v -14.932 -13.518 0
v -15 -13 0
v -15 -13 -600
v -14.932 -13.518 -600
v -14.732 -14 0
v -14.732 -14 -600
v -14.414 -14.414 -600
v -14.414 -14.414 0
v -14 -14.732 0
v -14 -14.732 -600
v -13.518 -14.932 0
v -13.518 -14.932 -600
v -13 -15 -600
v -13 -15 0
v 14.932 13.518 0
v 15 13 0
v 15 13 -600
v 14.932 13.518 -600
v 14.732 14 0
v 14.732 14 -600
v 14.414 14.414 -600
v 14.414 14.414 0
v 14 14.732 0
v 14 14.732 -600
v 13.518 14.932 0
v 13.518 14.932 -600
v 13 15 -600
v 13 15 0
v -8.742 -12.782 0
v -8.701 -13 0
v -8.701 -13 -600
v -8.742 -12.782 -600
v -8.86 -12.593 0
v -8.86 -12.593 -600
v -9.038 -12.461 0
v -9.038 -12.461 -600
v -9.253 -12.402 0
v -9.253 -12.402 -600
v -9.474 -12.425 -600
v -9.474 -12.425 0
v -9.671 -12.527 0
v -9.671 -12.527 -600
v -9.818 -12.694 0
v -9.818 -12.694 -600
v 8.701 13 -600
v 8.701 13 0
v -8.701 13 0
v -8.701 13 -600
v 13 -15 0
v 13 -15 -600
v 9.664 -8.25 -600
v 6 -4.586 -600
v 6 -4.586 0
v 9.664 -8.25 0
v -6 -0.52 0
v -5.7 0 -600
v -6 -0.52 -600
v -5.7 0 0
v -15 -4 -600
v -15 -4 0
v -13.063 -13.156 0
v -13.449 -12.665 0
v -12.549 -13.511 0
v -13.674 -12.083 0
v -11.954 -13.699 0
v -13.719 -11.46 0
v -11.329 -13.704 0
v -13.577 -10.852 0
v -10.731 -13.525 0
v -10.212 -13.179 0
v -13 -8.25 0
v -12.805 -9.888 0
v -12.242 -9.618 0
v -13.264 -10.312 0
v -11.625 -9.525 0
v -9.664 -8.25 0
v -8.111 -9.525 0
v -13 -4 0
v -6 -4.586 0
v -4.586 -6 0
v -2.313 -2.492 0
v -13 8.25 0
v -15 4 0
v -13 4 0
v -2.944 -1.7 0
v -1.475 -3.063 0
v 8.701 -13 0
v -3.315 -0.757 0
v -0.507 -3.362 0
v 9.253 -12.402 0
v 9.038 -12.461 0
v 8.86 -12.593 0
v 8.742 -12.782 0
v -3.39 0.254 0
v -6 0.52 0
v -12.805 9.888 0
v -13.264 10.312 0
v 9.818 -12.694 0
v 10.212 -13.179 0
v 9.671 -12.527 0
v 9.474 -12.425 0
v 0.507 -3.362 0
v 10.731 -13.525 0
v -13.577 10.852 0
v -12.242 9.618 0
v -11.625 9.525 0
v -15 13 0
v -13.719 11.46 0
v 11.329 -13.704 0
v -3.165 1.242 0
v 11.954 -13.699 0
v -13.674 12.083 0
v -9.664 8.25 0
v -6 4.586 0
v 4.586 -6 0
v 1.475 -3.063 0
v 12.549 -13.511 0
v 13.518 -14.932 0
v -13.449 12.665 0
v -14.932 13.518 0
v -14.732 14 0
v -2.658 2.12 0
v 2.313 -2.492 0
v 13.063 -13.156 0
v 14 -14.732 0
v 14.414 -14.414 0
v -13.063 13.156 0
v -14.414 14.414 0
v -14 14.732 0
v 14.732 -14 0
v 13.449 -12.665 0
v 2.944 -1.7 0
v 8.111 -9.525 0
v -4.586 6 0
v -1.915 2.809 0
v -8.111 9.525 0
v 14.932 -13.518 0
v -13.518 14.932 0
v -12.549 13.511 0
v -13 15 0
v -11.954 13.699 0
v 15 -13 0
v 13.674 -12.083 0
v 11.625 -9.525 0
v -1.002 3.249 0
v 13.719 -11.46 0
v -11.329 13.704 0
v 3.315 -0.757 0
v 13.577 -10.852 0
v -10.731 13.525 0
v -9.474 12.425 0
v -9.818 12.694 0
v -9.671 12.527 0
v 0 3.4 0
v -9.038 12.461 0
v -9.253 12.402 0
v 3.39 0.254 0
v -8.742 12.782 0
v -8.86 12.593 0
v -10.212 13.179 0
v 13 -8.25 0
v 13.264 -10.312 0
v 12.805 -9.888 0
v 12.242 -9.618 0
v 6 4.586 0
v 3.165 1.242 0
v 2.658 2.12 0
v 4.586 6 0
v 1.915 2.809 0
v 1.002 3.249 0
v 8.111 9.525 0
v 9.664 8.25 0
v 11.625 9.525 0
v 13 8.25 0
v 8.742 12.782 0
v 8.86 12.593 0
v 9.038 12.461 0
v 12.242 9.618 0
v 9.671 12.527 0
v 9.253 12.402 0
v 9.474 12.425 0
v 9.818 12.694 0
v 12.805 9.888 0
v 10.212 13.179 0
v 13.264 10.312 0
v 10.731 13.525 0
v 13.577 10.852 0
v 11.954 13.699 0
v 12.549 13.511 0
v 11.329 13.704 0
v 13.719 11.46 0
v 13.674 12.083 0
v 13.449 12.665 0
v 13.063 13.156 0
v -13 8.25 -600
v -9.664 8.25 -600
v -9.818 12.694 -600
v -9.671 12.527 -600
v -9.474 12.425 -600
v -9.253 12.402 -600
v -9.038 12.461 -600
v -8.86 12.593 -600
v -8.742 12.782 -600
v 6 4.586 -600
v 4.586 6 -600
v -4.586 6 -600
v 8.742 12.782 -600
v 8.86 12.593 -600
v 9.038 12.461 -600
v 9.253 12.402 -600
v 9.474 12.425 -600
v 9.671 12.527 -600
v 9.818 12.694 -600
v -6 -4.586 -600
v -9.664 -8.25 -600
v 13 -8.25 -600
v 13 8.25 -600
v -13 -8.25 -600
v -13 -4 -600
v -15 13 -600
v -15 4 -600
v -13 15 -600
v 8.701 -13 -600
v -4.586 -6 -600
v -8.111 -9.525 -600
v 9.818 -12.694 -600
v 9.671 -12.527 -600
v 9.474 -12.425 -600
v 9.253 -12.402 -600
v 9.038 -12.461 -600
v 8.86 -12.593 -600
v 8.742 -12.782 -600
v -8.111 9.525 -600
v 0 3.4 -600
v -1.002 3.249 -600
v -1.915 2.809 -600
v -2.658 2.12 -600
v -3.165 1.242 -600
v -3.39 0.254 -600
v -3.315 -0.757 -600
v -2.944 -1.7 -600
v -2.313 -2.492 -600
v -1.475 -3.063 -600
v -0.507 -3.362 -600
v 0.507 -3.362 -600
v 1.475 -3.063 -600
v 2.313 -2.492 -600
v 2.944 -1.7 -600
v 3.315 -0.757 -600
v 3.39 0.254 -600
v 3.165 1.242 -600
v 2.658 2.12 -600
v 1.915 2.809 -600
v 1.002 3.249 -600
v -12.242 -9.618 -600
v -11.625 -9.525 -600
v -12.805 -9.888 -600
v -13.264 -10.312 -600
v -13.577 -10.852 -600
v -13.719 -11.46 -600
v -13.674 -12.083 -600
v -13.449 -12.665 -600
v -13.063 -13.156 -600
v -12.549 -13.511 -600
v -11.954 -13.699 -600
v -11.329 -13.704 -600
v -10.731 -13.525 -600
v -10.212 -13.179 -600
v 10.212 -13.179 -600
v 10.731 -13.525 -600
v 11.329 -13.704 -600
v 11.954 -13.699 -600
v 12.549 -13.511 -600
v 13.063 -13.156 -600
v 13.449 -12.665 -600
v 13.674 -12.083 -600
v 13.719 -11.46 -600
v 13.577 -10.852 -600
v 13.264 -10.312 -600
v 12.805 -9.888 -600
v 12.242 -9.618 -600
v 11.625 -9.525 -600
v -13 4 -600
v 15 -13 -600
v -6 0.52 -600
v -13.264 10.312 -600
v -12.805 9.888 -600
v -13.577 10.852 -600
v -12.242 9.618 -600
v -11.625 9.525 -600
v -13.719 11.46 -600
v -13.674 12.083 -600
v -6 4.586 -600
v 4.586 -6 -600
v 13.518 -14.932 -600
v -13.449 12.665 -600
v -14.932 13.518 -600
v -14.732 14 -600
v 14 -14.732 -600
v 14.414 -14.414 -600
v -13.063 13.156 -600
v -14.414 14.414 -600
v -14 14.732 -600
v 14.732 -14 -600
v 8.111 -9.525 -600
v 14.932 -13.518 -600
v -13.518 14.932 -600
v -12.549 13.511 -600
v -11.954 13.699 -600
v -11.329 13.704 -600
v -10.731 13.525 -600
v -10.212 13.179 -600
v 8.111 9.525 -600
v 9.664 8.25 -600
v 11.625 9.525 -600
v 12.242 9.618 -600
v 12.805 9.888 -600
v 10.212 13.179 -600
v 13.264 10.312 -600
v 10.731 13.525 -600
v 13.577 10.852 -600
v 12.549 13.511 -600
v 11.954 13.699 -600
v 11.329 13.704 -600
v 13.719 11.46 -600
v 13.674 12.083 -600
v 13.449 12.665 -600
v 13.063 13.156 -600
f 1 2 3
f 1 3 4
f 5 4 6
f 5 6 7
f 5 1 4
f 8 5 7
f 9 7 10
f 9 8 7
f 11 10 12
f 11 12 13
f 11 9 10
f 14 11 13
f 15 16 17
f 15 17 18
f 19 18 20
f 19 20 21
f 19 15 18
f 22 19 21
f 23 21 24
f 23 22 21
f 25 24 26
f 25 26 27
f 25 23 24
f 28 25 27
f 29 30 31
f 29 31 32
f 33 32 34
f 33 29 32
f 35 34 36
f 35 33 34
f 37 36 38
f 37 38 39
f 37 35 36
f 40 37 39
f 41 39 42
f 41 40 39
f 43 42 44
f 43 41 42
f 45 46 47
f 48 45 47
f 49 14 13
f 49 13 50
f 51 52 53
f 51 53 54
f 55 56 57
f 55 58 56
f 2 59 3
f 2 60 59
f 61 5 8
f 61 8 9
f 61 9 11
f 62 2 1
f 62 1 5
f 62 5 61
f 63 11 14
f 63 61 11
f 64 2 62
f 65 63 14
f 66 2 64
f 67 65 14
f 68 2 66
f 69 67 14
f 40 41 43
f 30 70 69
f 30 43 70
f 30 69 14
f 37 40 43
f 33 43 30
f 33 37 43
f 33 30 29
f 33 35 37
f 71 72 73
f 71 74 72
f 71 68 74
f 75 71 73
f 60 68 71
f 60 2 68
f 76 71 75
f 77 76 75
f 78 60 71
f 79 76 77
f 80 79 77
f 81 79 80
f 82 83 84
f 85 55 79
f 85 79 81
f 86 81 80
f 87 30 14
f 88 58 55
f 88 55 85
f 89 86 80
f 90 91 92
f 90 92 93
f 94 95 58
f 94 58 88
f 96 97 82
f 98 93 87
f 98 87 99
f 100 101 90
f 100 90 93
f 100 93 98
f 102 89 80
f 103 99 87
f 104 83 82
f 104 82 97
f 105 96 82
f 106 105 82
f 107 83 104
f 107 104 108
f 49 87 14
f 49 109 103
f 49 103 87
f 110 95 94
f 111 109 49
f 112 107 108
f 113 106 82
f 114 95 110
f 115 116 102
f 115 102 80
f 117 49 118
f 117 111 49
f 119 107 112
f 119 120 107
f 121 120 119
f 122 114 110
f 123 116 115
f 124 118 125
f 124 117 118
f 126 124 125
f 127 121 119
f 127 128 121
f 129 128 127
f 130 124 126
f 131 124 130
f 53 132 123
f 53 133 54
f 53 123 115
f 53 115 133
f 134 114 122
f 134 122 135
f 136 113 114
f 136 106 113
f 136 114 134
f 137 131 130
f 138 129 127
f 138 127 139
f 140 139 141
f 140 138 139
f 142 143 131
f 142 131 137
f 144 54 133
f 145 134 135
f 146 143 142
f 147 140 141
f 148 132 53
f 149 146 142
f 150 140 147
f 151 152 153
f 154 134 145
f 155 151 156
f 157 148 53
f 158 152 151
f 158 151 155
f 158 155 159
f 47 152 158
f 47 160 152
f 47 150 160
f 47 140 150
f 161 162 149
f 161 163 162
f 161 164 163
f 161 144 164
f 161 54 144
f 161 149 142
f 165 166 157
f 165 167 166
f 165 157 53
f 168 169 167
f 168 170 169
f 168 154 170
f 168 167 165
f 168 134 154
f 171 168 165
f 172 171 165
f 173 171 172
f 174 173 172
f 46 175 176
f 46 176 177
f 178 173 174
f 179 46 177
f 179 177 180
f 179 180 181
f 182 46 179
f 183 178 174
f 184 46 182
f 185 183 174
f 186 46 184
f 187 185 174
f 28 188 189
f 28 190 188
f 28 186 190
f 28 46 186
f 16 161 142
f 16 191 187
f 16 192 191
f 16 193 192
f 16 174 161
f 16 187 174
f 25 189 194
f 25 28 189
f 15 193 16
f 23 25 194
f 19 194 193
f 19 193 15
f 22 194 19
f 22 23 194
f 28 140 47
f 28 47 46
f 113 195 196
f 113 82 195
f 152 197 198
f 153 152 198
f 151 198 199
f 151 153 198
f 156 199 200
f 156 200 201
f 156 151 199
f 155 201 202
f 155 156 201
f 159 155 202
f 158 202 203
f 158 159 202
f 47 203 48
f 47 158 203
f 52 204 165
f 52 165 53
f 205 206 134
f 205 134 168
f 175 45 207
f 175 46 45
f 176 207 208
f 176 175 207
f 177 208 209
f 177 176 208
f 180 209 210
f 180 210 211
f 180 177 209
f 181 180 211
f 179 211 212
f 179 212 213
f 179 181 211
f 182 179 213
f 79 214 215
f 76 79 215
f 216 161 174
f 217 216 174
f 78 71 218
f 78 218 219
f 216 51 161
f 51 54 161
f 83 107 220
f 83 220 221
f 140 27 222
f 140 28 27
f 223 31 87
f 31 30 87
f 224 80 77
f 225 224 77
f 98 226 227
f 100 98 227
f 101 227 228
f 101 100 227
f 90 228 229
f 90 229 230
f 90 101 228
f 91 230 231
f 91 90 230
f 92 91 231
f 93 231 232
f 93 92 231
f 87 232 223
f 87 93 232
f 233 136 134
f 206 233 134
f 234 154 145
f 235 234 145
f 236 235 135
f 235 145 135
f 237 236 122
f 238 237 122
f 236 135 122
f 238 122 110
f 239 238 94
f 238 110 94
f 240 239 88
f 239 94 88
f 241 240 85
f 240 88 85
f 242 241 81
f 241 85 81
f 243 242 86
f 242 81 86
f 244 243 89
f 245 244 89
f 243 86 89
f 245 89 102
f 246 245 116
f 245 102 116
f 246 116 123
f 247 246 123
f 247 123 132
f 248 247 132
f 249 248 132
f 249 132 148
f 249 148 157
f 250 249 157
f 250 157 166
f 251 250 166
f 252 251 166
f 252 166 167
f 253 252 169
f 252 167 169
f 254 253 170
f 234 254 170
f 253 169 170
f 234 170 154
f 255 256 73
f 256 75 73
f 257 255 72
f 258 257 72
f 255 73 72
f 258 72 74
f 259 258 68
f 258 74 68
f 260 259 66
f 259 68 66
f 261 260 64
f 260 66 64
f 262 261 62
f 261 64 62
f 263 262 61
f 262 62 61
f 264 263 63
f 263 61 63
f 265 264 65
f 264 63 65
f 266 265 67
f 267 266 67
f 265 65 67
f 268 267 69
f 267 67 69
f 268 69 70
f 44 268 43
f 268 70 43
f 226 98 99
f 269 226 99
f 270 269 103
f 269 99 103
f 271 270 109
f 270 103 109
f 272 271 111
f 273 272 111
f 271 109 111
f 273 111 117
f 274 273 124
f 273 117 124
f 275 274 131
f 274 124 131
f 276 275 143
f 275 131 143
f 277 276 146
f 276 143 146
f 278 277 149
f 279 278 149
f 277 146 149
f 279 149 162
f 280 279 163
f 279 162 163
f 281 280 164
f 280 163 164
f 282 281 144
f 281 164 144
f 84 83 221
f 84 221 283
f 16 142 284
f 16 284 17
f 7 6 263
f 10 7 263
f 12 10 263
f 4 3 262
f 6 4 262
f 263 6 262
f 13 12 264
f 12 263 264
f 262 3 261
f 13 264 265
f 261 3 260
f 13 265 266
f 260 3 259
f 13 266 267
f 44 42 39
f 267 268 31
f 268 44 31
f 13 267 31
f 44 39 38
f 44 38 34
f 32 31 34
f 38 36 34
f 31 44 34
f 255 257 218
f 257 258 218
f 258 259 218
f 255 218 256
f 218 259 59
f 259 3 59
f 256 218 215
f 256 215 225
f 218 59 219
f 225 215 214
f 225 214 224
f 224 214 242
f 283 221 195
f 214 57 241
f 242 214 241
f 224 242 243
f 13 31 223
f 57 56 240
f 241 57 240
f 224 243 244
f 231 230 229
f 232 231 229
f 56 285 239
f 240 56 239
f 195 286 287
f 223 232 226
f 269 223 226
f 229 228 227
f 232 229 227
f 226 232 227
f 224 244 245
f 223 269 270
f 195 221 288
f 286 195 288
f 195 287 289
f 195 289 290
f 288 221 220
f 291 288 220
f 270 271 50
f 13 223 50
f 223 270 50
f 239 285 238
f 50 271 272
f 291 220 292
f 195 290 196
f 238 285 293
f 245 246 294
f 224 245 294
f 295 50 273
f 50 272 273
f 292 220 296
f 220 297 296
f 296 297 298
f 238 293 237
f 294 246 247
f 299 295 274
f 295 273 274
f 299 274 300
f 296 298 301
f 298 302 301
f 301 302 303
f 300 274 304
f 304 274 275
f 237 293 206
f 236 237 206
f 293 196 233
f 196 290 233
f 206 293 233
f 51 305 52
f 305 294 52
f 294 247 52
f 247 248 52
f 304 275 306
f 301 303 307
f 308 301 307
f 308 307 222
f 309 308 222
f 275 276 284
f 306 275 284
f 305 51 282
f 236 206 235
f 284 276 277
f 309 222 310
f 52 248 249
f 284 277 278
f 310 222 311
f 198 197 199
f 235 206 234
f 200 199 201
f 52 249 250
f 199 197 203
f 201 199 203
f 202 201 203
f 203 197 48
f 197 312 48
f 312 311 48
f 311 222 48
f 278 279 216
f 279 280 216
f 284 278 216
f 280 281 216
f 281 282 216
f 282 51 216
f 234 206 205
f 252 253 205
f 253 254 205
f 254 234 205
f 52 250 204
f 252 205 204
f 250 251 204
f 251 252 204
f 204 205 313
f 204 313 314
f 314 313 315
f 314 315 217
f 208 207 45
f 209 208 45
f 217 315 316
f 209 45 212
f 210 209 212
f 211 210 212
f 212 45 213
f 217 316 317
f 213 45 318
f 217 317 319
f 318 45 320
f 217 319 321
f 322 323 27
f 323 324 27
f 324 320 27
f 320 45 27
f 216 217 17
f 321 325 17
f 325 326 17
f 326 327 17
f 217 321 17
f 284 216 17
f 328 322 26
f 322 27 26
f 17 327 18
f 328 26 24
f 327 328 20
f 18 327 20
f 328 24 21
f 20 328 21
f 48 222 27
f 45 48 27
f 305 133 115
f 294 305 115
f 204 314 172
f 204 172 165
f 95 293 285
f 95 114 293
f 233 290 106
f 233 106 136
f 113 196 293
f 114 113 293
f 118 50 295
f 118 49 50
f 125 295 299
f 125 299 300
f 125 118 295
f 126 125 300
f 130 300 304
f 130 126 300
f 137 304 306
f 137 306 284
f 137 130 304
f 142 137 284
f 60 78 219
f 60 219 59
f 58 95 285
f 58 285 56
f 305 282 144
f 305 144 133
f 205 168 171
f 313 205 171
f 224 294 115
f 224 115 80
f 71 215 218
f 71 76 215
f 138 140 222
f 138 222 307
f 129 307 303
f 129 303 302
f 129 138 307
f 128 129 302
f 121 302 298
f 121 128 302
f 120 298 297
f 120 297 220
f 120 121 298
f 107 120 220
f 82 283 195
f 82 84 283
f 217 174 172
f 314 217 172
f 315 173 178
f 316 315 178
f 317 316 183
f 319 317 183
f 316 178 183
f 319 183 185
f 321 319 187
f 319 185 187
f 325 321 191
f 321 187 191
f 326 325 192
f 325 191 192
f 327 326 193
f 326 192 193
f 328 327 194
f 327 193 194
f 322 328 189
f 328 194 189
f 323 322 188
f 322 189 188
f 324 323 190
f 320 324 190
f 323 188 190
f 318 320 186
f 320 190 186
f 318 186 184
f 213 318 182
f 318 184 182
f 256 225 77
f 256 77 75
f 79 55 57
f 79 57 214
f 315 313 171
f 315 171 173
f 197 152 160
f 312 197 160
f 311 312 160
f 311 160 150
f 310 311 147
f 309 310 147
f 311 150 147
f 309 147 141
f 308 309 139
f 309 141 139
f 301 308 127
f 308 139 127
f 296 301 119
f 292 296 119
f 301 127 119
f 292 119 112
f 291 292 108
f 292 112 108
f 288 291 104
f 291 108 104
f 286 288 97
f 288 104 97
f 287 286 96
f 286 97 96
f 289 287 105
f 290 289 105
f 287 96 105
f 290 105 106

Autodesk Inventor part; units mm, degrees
sketch "Sketch_122" plane through (0, 0, 0) normal (0, 0, 1) x (1, 0, 0)
  arc A0 (-15, -13) -> (-13, -15) centre (-13, -13) ccw
  line L0 (-13, -15) -> (13, -15)
  arc A1 (13, -15) -> (15, -13) centre (13, -13) ccw
  line L1 (15, -13) -> (15, 13)
  arc A2 (15, 13) -> (13, 15) centre (13, 13) ccw
  line L2 (13, 15) -> (-13, 15)
  arc A3 (-13, 15) -> (-15, 13) centre (-13, 13) ccw
  line L3 (-15, 13) -> (-15, 4)
  line L4 (-15, 4) -> (-13, 4)
  line L5 (-13, 4) -> (-13, 8.25)
  line L6 (-13, 8.25) -> (-9.6642, 8.25)
  line L7 (-9.6642, 8.25) -> (-6, 4.5858)
  line L8 (-6, 4.5858) -> (-6, 0.5196)
  line L9 (-6, 0.5196) -> (-5.7, 0)
  line L10 (-5.7, 0) -> (-6, -0.5196)
  line L11 (-6, -0.5196) -> (-6, -4.5858)
  line L12 (-6, -4.5858) -> (-9.6642, -8.25)
  line L13 (-9.6642, -8.25) -> (-13, -8.25)
  line L14 (-13, -8.25) -> (-13, -4)
  line L15 (-13, -4) -> (-15, -4)
  line L16 (-15, -4) -> (-15, -13)
  line L17 (6, -4.5858) -> (9.6642, -8.25)
  line L18 (9.6642, -8.25) -> (13, -8.25)
  line L19 (13, -8.25) -> (13, 8.25)
  line L20 (13, 8.25) -> (9.6642, 8.25)
  line L21 (9.6642, 8.25) -> (6, 4.5858)
  line L22 (6, 4.5858) -> (6, -4.5858)
extrude "Extrusion1" add sketch "Sketch_122" against normal blind 600
sketch "Sketch2" plane through (0, 0, -600) normal (0, 0, -1) x (-1, 0, 0)
  point P0 (0, 0)
hole "Hole1" at (0, 0, -600) direction (0, 0, 1) diameter 6.8 depth 600
sketch "Sketch_173" plane through (0, 0, 0) normal (0, 0, 1) x (1, 0, 0)
  arc A0 (-9.8177, 12.6944) -> (-11.625, 9.525) centre (-11.625, 11.625) ccw
  line L0 (-11.625, 9.525) -> (-8.1108, 9.525)
  line L1 (-8.1108, 9.525) -> (-4.5858, 6)
  line L2 (-4.5858, 6) -> (4.5858, 6)
  line L3 (4.5858, 6) -> (8.1108, 9.525)
  line L4 (8.1108, 9.525) -> (11.625, 9.525)
  arc A1 (11.625, 9.525) -> (9.8177, 12.6944) centre (11.625, 11.625) ccw
  arc A2 (8.7013, 13) -> (9.8177, 12.6944) centre (9.3013, 13) ccw
  line L5 (8.7013, 13) -> (-8.7013, 13)
  arc A3 (-9.8177, 12.6944) -> (-8.7013, 13) centre (-9.3013, 13) ccw
extrude "Extrusion2" cut sketch "Sketch_173" against normal blind 600
sketch "Sketch_174" plane through (0, 0, 0) normal (0, 0, 1) x (1, 0, 0)
  arc A0 (-11.625, -9.525) -> (-9.8177, -12.6944) centre (-11.625, -11.625) ccw
  arc A1 (-8.7013, -13) -> (-9.8177, -12.6944) centre (-9.3013, -13) ccw
  line L0 (-8.7013, -13) -> (8.7013, -13)
  arc A2 (9.8177, -12.6944) -> (8.7013, -13) centre (9.3013, -13) ccw
  arc A3 (9.8177, -12.6944) -> (11.625, -9.525) centre (11.625, -11.625) ccw
  line L1 (11.625, -9.525) -> (8.1108, -9.525)
  line L2 (8.1108, -9.525) -> (4.5858, -6)
  line L3 (4.5858, -6) -> (-4.5858, -6)
  line L4 (-4.5858, -6) -> (-8.1108, -9.525)
  line L5 (-8.1108, -9.525) -> (-11.625, -9.525)
extrude "Extrusion3" cut sketch "Sketch_174" against normal blind 600
ref_plane "C1_XY" through (0, 0, 0) normal (0, 0, 1) x (1, 0, 0)
ref_plane "C1_YZ" through (0, 0, 0) normal (1, 0, 0) x (0, 1, 0)
ref_plane "C1_ZX" through (0, 0, 0) normal (0, 1, 0) x (0, 0, 1)
ref_plane "to_frame_cap1_XY" through (0, 0, 0) normal (0, 0, 1) x (1, 0, 0)
ref_plane "to_frame_cap1_YZ" through (0, 0, 0) normal (1, 0, 0) x (0, 1, 0)
ref_plane "to_frame_cap1_ZX" through (0, 0, 0) normal (0, 1, 0) x (0, 0, 1)
ref_plane "to_frame_cap2_XY" through (0, 0, -600) normal (0, 0, -1) x (1, 0, 0)
ref_plane "to_frame_cap2_YZ" through (0, 0, -600) normal (1, 0, 0) x (0, -1, 0)
ref_plane "to_frame_cap2_ZX" through (0, 0, -600) normal (0, -1, 0) x (0, 0, -1)
thread "Thread1" size "M8x1.25" class "6H" standard "ANSI Metric M Profile" length 10
thread "Thread2" size "M7x1" class "6H" standard "ANSI Metric M Profile" length 10
properties part number "HFSC6-3030-600" material "Aluminum 6061"
